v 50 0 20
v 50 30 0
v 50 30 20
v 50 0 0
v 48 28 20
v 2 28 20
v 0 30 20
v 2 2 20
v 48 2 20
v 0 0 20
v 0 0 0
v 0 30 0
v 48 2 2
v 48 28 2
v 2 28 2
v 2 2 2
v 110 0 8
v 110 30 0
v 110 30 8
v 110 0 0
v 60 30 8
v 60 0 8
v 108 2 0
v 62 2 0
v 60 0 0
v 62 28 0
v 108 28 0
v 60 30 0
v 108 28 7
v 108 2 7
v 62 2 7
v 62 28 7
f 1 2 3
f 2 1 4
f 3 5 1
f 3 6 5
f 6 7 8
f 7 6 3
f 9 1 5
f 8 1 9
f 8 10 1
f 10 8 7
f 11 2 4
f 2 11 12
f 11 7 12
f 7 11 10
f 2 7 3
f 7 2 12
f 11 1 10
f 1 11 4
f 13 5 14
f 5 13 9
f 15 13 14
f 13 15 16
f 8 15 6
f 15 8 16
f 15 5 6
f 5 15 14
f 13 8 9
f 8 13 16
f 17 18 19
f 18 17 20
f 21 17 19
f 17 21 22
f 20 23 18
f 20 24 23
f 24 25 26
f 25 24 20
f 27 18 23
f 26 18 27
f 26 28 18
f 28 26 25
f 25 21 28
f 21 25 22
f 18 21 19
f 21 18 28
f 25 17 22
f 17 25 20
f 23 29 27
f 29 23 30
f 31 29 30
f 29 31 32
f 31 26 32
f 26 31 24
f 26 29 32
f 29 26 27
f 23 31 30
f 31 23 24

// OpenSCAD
// box-hardcoded.scad — magic numbers everywhere; the lid never fits right.
difference() {
  cube([50, 30, 20]);
  translate([2, 2, 2]) cube([46, 26, 20]);
}
translate([60, 0, 0]) difference() {     // the "lid"
  cube([50, 30, 8]);
  translate([2, 2, -1]) cube([46, 26, 8]);
}
